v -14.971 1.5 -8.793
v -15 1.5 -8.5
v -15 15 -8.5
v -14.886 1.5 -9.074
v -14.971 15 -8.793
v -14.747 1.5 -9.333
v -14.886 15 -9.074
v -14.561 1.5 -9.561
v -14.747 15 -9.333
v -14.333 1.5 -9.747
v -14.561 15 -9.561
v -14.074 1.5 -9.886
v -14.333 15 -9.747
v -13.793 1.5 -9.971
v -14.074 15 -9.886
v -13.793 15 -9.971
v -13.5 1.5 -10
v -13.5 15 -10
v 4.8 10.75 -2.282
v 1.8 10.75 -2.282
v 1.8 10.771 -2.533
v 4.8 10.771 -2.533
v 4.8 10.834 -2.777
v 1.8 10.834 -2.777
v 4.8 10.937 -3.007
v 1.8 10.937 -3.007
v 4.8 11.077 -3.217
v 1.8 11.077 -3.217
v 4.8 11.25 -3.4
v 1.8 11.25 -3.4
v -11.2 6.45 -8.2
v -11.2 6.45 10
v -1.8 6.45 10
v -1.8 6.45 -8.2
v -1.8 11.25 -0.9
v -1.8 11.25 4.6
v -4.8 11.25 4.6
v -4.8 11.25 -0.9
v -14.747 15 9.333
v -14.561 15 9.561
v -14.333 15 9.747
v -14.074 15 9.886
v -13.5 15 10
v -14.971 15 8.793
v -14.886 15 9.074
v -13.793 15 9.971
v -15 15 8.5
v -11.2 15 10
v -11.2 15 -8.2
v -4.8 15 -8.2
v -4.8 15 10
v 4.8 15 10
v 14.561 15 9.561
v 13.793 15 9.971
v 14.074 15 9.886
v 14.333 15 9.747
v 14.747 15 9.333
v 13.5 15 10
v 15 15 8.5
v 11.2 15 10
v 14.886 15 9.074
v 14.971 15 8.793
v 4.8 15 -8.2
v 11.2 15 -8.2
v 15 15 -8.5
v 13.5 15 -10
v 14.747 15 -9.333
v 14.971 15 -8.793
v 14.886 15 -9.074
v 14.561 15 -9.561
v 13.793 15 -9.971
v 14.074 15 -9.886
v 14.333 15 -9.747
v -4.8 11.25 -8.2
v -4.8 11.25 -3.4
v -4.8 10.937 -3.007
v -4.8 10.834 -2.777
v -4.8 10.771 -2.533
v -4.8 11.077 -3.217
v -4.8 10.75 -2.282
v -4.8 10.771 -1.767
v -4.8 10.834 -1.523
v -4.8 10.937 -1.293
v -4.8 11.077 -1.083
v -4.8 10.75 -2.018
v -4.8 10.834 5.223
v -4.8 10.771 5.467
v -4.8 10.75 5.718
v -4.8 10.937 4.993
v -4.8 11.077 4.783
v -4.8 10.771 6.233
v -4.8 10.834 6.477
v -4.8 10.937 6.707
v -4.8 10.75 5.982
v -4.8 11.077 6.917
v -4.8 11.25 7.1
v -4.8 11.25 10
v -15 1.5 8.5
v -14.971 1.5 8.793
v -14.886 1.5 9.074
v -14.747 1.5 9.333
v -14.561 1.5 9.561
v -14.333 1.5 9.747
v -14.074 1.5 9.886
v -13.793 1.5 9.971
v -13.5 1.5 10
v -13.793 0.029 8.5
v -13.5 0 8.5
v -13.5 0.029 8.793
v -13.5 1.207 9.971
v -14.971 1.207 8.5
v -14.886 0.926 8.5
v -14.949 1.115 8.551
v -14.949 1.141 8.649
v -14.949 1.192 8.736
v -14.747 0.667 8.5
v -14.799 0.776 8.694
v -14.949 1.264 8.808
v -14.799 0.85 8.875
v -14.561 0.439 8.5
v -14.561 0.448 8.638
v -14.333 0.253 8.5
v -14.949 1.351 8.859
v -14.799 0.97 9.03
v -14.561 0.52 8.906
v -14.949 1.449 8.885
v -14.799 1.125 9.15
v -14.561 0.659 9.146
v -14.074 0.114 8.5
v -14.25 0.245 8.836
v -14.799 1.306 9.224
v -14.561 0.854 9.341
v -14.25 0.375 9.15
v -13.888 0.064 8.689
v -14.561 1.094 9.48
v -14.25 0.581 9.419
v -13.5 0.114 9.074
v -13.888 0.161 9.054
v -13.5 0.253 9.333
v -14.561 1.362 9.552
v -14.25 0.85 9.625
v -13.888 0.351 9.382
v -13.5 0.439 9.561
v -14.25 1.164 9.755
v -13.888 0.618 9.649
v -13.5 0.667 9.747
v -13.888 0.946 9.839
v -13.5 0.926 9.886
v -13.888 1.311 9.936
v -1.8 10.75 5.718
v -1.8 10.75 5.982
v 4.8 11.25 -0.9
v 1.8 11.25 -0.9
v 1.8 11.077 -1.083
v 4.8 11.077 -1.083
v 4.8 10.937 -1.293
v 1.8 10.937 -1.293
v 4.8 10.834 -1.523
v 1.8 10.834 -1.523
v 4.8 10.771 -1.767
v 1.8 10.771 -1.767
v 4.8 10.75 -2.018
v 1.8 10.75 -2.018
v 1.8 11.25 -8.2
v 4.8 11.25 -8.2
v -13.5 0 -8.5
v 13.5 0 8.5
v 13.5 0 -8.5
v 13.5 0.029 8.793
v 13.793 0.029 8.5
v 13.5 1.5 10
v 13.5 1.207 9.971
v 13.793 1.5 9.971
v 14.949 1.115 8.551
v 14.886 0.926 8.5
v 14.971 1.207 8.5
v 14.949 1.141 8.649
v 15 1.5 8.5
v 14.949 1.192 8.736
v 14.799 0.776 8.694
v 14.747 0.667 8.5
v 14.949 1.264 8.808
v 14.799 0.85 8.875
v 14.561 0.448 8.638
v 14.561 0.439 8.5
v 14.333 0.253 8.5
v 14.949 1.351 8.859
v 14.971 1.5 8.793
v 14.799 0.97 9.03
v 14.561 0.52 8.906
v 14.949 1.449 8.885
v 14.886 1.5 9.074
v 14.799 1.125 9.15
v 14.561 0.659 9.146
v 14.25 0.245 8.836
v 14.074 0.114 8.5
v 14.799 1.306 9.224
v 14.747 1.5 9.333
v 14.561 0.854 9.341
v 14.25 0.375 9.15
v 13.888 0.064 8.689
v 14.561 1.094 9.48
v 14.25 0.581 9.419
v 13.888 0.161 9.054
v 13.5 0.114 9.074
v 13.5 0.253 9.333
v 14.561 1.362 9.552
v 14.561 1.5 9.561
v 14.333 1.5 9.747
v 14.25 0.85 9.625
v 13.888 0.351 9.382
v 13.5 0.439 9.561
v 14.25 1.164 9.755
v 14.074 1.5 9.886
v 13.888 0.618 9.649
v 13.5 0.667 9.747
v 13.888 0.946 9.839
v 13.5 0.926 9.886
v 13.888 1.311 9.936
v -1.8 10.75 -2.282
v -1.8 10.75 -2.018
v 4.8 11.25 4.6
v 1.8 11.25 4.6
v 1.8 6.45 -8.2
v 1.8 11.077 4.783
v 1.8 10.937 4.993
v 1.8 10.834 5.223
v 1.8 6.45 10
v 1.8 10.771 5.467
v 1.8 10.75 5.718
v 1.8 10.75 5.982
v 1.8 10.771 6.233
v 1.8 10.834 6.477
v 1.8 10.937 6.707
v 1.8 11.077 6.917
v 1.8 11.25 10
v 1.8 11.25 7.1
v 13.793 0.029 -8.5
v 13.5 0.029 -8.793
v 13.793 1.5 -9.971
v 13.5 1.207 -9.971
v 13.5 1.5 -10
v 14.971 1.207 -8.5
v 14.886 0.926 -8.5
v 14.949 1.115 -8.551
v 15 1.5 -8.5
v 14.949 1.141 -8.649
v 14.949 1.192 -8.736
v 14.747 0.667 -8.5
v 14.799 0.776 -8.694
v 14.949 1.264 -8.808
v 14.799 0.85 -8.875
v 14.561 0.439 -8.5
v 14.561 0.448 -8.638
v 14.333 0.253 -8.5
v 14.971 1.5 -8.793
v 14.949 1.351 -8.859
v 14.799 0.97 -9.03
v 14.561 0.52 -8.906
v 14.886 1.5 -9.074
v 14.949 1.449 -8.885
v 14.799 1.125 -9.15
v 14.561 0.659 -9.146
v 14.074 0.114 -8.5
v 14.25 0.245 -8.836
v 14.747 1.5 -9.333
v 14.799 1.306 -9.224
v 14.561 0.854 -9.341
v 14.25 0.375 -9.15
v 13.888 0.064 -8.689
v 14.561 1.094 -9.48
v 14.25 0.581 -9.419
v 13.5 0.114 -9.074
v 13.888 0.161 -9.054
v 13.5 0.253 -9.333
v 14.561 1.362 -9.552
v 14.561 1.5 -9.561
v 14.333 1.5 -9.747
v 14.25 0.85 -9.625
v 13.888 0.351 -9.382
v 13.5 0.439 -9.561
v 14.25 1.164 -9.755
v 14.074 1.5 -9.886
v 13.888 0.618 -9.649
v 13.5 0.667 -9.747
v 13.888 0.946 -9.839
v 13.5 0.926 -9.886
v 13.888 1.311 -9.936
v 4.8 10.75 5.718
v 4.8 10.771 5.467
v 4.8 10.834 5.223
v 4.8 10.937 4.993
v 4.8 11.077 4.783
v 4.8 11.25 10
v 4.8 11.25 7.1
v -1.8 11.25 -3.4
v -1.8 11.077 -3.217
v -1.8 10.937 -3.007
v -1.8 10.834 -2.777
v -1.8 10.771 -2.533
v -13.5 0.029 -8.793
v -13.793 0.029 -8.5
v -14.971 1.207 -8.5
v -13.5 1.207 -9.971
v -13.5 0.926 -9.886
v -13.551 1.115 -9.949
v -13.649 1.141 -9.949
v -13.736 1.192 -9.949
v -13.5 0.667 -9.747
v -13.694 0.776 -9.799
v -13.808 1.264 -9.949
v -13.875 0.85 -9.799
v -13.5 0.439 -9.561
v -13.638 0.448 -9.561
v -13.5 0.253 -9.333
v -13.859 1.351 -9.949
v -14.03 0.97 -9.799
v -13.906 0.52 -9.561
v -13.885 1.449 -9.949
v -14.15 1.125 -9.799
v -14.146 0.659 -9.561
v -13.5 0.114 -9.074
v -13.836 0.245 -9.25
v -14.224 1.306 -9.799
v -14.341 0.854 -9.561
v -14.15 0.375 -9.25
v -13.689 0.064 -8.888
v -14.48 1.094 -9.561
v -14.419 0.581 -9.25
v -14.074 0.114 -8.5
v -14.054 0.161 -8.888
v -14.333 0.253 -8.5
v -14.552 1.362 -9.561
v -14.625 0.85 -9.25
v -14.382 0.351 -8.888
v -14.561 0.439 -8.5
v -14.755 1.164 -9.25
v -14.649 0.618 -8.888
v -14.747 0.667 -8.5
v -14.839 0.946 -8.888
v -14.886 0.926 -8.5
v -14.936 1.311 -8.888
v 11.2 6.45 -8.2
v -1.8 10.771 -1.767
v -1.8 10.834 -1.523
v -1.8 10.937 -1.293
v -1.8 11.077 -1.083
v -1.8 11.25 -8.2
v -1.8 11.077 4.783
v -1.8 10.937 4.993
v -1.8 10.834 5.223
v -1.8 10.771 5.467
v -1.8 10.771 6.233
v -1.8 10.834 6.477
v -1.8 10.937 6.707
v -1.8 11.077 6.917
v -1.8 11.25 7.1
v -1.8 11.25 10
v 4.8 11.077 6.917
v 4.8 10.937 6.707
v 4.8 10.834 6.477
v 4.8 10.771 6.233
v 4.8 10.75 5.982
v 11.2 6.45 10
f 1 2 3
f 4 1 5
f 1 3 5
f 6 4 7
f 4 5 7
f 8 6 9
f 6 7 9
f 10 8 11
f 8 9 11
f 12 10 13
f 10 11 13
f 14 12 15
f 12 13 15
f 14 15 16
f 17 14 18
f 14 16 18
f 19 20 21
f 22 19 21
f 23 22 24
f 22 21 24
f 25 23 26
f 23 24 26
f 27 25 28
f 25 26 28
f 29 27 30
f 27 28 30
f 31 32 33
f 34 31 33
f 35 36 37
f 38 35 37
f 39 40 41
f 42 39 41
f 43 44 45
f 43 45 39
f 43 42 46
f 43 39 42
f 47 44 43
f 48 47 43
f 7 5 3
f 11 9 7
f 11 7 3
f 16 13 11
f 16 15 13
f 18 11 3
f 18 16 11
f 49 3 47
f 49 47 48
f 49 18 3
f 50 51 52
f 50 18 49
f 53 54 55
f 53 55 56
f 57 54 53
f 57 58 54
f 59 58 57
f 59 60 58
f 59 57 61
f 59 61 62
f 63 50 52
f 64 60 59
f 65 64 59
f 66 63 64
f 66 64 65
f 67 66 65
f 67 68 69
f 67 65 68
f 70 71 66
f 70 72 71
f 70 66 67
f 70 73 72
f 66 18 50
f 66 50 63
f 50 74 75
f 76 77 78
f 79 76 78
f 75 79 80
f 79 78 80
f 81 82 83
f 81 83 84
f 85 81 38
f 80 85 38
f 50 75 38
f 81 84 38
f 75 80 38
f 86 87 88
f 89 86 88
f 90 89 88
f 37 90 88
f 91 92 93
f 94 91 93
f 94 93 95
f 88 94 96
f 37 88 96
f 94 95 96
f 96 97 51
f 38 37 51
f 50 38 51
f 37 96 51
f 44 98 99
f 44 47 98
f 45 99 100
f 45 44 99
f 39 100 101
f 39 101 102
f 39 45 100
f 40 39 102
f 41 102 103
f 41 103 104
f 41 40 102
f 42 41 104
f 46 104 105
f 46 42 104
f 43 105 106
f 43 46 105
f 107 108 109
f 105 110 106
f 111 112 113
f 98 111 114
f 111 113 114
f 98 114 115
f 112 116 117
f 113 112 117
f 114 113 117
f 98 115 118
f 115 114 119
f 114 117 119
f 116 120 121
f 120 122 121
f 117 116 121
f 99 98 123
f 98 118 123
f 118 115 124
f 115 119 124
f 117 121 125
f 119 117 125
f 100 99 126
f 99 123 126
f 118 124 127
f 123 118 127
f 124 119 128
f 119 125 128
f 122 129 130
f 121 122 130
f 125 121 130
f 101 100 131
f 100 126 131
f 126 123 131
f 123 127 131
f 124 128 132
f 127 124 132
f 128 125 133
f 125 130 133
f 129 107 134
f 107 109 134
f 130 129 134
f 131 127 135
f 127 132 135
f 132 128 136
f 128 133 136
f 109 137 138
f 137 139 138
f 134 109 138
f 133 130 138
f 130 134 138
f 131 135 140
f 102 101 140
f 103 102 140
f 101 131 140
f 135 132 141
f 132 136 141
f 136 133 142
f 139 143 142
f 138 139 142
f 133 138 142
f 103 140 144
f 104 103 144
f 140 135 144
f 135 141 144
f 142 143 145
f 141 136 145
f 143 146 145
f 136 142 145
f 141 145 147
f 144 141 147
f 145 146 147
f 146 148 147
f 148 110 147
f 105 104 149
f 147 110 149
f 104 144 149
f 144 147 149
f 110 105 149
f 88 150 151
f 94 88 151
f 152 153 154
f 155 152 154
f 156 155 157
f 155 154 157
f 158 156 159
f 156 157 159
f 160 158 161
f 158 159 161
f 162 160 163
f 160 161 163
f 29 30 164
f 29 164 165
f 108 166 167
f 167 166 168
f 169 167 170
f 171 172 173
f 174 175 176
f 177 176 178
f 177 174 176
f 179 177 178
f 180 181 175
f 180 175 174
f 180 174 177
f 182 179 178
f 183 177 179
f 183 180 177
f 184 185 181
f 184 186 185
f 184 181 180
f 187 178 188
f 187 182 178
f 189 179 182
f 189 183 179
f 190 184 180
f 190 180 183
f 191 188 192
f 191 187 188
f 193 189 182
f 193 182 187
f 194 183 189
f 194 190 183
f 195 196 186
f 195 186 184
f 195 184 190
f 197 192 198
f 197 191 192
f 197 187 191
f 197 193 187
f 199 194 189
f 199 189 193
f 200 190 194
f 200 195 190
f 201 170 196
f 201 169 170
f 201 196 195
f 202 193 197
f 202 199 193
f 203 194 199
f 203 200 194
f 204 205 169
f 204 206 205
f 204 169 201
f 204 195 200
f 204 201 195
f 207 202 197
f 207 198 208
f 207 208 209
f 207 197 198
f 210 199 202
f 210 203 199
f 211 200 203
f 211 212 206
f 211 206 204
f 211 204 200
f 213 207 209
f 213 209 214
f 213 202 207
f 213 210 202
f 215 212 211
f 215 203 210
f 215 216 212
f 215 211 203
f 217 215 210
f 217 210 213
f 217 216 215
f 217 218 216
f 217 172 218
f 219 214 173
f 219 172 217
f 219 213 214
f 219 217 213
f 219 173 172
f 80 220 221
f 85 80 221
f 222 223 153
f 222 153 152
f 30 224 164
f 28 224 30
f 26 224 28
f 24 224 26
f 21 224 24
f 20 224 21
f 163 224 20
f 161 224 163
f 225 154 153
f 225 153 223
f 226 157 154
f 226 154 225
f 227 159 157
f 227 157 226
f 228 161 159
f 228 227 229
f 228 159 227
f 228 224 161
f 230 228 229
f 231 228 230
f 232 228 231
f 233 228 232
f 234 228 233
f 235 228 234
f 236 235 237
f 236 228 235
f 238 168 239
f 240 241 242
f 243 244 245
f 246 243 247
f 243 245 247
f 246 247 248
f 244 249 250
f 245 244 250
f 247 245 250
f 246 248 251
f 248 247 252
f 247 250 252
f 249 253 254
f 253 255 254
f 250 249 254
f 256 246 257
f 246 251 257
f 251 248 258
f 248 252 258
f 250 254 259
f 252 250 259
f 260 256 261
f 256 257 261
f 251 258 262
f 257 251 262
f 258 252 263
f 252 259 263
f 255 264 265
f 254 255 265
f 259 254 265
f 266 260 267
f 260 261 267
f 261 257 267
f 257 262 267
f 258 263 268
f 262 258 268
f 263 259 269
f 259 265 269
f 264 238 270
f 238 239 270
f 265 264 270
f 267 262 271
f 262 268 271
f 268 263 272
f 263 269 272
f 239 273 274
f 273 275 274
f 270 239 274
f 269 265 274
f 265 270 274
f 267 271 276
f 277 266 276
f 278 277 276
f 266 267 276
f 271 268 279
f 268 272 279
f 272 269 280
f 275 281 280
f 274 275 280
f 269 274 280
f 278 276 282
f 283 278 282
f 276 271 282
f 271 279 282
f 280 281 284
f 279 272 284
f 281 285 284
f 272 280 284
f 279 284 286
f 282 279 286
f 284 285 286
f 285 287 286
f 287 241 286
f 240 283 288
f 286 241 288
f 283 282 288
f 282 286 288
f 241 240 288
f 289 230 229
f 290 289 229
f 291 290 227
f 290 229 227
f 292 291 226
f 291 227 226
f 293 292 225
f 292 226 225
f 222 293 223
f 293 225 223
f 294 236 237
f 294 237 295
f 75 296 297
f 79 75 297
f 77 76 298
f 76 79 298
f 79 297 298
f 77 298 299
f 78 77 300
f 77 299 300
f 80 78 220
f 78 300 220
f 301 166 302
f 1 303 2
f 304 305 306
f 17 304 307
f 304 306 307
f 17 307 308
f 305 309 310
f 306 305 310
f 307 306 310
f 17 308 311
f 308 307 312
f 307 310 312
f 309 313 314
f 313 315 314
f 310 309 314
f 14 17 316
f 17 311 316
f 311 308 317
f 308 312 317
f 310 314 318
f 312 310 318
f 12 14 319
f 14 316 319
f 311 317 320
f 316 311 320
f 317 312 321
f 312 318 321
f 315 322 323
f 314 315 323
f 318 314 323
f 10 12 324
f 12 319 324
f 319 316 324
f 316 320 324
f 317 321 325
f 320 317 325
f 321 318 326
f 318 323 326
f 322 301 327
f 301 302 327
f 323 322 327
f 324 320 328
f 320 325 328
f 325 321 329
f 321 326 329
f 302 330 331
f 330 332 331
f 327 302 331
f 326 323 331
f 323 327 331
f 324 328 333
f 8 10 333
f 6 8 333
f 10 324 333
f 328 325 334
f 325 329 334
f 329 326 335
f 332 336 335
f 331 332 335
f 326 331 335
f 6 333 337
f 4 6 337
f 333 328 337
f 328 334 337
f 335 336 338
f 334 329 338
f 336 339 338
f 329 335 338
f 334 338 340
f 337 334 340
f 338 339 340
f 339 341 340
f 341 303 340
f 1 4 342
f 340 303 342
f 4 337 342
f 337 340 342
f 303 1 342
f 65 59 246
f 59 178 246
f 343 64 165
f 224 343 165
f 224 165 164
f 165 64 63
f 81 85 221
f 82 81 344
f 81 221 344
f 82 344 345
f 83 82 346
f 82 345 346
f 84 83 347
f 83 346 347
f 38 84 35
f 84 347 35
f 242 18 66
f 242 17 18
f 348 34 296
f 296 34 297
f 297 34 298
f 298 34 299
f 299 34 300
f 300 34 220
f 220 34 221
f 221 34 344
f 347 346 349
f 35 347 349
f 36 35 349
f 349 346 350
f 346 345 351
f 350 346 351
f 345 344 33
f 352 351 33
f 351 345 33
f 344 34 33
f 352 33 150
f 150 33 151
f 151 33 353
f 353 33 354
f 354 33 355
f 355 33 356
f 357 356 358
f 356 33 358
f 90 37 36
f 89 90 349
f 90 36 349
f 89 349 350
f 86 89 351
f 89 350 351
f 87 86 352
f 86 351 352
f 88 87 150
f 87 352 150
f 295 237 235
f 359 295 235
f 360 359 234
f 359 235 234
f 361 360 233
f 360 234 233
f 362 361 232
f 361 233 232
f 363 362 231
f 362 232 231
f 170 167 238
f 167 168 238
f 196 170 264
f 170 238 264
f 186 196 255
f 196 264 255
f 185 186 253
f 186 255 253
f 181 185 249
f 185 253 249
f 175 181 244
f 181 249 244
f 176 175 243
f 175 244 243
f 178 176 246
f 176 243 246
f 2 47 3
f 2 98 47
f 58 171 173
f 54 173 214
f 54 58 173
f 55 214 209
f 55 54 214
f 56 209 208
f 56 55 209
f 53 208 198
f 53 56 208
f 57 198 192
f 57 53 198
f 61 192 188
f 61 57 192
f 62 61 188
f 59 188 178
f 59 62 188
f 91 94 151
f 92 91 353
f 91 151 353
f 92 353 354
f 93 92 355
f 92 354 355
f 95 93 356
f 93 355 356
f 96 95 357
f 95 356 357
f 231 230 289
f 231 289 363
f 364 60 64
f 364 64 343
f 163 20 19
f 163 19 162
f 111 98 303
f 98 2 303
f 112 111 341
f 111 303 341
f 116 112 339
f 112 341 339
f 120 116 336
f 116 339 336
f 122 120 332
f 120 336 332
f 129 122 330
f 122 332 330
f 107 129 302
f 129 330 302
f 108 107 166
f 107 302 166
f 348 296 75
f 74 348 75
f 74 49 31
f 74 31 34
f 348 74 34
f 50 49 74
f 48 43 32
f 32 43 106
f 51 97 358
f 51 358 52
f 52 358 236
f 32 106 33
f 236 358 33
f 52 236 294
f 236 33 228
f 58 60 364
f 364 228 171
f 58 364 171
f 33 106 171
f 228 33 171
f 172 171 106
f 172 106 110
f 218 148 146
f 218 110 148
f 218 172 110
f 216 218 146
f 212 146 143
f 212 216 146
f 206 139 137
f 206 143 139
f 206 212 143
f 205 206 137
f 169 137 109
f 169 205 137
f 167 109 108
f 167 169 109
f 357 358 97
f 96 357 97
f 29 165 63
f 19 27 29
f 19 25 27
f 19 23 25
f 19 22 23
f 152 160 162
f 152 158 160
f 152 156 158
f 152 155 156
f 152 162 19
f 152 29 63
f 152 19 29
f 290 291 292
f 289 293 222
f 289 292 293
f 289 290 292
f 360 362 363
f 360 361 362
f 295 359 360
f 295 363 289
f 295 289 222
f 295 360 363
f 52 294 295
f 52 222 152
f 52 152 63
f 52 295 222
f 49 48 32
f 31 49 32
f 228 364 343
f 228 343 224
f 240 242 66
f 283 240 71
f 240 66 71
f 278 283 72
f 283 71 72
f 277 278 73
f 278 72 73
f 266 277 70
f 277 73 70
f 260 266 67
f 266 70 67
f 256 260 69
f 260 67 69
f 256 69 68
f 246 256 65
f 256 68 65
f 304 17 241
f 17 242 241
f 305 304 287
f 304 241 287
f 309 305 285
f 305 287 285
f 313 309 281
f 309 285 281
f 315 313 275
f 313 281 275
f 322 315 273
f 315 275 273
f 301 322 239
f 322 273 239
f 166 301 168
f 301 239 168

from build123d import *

# Parameters (mm, degrees)
SKETCH2_W            = 30
SKETCH2_H            = 20
BOSS_EXTRUDE1_DEPTH  = 15
CUT_EXTRUDE1_DEPTH   = 18.2
SKETCH4_W            = 2.5
SKETCH4_H            = 0.5
BOSS_EXTRUDE2_DEPTH  = 3
FILLET1_R            = 1.5
FILLET1_OF_MIRROR2_R = 1.5
FILLET2_R            = 1.5


with BuildPart() as part:
    # Sketch2 → Boss-Extrude1 (new body)
    with BuildSketch(Plane(origin=(0, 0, 0), x_dir=(1, 0, 0), z_dir=(0, 1, 0))):
        Rectangle(SKETCH2_W, SKETCH2_H)
    extrude(amount=BOSS_EXTRUDE1_DEPTH)

    # Sketch3 → Cut-Extrude1 (cut)
    with BuildSketch(Plane.XY.offset(10)):
        Polygon((-11.2, 15), (-11.2, 6.45), (-1.8, 6.45), (-1.8, 11.25), (-4.8, 11.25), (-4.8, 15), align=None)
    cut_extrude1 = extrude(amount=-CUT_EXTRUDE1_DEPTH, mode=Mode.SUBTRACT)

    # Sketch4 → Boss-Extrude2 (add)
    with BuildSketch(Plane.ZY.offset(1.8)):
        with Locations((5.85, 11)):
            Rectangle(SKETCH4_W, SKETCH4_H)
        with Locations((-2.15, 11)):
            Rectangle(SKETCH4_W, SKETCH4_H)
    boss_extrude2 = extrude(amount=BOSS_EXTRUDE2_DEPTH)

    # Fillet1
    # the kernel refuses this fillet: 1.5 mm, written as the material it takes off along each edge
    with BuildSketch(Plane(origin=(-1.8, 10.75, 4.6), x_dir=(0, 0, 1), z_dir=(-1, 0, 0)), Plane(origin=(-1.8, 10.75, -3.4), x_dir=(0, 0, 1), z_dir=(-1, 0, 0))) as fillet1_piece_1:
        with BuildLine():
            CenterArc((1.118033989, 1.5), FILLET1_R, 221.810314896, 48.189685104)
            Line((0, 0.5), (-0.02236068, 0.48))
            ThreePointArc((-0.02236068, 0.48), (-0.03, 0.25), (-0.03, 0))
            Line((-0.03, 0), (0, -0.03))
            Line((0, -0.03), (1.118033989, -0.03))
            Line((1.118033989, -0.03), (1.118033989, 0))
        make_face()
    extrude(amount=5.795084972, mode=Mode.SUBTRACT)
    with BuildSketch(Plane(origin=(-1.8, 10.75, 7.1), x_dir=(0, 1, 0), z_dir=(-1, 0, 0)), Plane(origin=(-1.8, 10.75, -0.9), x_dir=(0, 1, 0), z_dir=(-1, 0, 0))) as fillet1_piece_2:
        with BuildLine():
            CenterArc((1.5, 1.118033989), FILLET1_R, 180, 48.189685104)
            Line((0, 1.118033989), (-0.03, 1.118033989))
            Line((-0.03, 1.118033989), (-0.03, 0))
            Line((-0.03, 0), (0, -0.03))
            ThreePointArc((0, -0.03), (0.25, -0.03), (0.48, -0.02236068))
            Line((0.48, -0.02236068), (0.5, 0))
        make_face()
    extrude(amount=5.795084972, mode=Mode.SUBTRACT)

    # Mirror2: Cut-Extrude1, Boss-Extrude2 across plane
    add(cut_extrude1.mirror(Plane(origin=(0, 0, 0), x_dir=(0, 0, 1), z_dir=(1, 0, 0))), mode=Mode.SUBTRACT)
    add(boss_extrude2.mirror(Plane(origin=(0, 0, 0), x_dir=(0, 0, 1), z_dir=(1, 0, 0))))

    # Fillet1 of Mirror2
    # the kernel refuses this fillet: 1.5 mm, written as the material it takes off along each edge
    with BuildSketch(Plane(origin=(1.8, 10.75, 4.6), x_dir=(0, 0, 1), z_dir=(1, 0, 0)), Plane(origin=(1.8, 10.75, -3.4), x_dir=(0, 0, 1), z_dir=(1, 0, 0))) as fillet1_of_mirror2_piece_1:
        with BuildLine():
            CenterArc((1.118033989, -1.5), FILLET1_OF_MIRROR2_R, 90, 48.189685104)
            Line((0, -0.5), (-0.02236068, -0.48))
            ThreePointArc((-0.02236068, -0.48), (-0.03, -0.25), (-0.03, 0))
            Line((-0.03, 0), (0, 0.03))
            Line((0, 0.03), (1.118033989, 0.03))
            Line((1.118033989, 0.03), (1.118033989, 0))
        make_face()
    extrude(amount=5.795084972, mode=Mode.SUBTRACT)
    with BuildSketch(Plane(origin=(1.8, 10.75, 7.1), x_dir=(0, 1, 0), z_dir=(1, 0, 0)), Plane(origin=(1.8, 10.75, -0.9), x_dir=(0, 1, 0), z_dir=(1, 0, 0))) as fillet1_of_mirror2_piece_2:
        with BuildLine():
            CenterArc((1.5, -1.118033989), FILLET1_OF_MIRROR2_R, 131.810314896, 48.189685104)
            Line((0, -1.118033989), (-0.03, -1.118033989))
            Line((-0.03, -1.118033989), (-0.03, 0))
            Line((-0.03, 0), (0, 0.03))
            ThreePointArc((0, 0.03), (0.25, 0.03), (0.48, 0.02236068))
            Line((0.48, 0.02236068), (0.5, 0))
        make_face()
    extrude(amount=5.795084972, mode=Mode.SUBTRACT)

    # Fillet2
    fillet2_edges = [part.edges().sort_by_distance(p)[0] for p in [
        (0, 0, 10),
        (-15, 0, 0),
        (0, 0, -10),
        (15, 0, 0),
        (15, 7.5, 10),
        (-15, 7.5, 10),
        (-15, 7.5, -10),
        (15, 7.5, -10),
    ]]
    fillet(fillet2_edges, radius=FILLET2_R)


solid = part.part
